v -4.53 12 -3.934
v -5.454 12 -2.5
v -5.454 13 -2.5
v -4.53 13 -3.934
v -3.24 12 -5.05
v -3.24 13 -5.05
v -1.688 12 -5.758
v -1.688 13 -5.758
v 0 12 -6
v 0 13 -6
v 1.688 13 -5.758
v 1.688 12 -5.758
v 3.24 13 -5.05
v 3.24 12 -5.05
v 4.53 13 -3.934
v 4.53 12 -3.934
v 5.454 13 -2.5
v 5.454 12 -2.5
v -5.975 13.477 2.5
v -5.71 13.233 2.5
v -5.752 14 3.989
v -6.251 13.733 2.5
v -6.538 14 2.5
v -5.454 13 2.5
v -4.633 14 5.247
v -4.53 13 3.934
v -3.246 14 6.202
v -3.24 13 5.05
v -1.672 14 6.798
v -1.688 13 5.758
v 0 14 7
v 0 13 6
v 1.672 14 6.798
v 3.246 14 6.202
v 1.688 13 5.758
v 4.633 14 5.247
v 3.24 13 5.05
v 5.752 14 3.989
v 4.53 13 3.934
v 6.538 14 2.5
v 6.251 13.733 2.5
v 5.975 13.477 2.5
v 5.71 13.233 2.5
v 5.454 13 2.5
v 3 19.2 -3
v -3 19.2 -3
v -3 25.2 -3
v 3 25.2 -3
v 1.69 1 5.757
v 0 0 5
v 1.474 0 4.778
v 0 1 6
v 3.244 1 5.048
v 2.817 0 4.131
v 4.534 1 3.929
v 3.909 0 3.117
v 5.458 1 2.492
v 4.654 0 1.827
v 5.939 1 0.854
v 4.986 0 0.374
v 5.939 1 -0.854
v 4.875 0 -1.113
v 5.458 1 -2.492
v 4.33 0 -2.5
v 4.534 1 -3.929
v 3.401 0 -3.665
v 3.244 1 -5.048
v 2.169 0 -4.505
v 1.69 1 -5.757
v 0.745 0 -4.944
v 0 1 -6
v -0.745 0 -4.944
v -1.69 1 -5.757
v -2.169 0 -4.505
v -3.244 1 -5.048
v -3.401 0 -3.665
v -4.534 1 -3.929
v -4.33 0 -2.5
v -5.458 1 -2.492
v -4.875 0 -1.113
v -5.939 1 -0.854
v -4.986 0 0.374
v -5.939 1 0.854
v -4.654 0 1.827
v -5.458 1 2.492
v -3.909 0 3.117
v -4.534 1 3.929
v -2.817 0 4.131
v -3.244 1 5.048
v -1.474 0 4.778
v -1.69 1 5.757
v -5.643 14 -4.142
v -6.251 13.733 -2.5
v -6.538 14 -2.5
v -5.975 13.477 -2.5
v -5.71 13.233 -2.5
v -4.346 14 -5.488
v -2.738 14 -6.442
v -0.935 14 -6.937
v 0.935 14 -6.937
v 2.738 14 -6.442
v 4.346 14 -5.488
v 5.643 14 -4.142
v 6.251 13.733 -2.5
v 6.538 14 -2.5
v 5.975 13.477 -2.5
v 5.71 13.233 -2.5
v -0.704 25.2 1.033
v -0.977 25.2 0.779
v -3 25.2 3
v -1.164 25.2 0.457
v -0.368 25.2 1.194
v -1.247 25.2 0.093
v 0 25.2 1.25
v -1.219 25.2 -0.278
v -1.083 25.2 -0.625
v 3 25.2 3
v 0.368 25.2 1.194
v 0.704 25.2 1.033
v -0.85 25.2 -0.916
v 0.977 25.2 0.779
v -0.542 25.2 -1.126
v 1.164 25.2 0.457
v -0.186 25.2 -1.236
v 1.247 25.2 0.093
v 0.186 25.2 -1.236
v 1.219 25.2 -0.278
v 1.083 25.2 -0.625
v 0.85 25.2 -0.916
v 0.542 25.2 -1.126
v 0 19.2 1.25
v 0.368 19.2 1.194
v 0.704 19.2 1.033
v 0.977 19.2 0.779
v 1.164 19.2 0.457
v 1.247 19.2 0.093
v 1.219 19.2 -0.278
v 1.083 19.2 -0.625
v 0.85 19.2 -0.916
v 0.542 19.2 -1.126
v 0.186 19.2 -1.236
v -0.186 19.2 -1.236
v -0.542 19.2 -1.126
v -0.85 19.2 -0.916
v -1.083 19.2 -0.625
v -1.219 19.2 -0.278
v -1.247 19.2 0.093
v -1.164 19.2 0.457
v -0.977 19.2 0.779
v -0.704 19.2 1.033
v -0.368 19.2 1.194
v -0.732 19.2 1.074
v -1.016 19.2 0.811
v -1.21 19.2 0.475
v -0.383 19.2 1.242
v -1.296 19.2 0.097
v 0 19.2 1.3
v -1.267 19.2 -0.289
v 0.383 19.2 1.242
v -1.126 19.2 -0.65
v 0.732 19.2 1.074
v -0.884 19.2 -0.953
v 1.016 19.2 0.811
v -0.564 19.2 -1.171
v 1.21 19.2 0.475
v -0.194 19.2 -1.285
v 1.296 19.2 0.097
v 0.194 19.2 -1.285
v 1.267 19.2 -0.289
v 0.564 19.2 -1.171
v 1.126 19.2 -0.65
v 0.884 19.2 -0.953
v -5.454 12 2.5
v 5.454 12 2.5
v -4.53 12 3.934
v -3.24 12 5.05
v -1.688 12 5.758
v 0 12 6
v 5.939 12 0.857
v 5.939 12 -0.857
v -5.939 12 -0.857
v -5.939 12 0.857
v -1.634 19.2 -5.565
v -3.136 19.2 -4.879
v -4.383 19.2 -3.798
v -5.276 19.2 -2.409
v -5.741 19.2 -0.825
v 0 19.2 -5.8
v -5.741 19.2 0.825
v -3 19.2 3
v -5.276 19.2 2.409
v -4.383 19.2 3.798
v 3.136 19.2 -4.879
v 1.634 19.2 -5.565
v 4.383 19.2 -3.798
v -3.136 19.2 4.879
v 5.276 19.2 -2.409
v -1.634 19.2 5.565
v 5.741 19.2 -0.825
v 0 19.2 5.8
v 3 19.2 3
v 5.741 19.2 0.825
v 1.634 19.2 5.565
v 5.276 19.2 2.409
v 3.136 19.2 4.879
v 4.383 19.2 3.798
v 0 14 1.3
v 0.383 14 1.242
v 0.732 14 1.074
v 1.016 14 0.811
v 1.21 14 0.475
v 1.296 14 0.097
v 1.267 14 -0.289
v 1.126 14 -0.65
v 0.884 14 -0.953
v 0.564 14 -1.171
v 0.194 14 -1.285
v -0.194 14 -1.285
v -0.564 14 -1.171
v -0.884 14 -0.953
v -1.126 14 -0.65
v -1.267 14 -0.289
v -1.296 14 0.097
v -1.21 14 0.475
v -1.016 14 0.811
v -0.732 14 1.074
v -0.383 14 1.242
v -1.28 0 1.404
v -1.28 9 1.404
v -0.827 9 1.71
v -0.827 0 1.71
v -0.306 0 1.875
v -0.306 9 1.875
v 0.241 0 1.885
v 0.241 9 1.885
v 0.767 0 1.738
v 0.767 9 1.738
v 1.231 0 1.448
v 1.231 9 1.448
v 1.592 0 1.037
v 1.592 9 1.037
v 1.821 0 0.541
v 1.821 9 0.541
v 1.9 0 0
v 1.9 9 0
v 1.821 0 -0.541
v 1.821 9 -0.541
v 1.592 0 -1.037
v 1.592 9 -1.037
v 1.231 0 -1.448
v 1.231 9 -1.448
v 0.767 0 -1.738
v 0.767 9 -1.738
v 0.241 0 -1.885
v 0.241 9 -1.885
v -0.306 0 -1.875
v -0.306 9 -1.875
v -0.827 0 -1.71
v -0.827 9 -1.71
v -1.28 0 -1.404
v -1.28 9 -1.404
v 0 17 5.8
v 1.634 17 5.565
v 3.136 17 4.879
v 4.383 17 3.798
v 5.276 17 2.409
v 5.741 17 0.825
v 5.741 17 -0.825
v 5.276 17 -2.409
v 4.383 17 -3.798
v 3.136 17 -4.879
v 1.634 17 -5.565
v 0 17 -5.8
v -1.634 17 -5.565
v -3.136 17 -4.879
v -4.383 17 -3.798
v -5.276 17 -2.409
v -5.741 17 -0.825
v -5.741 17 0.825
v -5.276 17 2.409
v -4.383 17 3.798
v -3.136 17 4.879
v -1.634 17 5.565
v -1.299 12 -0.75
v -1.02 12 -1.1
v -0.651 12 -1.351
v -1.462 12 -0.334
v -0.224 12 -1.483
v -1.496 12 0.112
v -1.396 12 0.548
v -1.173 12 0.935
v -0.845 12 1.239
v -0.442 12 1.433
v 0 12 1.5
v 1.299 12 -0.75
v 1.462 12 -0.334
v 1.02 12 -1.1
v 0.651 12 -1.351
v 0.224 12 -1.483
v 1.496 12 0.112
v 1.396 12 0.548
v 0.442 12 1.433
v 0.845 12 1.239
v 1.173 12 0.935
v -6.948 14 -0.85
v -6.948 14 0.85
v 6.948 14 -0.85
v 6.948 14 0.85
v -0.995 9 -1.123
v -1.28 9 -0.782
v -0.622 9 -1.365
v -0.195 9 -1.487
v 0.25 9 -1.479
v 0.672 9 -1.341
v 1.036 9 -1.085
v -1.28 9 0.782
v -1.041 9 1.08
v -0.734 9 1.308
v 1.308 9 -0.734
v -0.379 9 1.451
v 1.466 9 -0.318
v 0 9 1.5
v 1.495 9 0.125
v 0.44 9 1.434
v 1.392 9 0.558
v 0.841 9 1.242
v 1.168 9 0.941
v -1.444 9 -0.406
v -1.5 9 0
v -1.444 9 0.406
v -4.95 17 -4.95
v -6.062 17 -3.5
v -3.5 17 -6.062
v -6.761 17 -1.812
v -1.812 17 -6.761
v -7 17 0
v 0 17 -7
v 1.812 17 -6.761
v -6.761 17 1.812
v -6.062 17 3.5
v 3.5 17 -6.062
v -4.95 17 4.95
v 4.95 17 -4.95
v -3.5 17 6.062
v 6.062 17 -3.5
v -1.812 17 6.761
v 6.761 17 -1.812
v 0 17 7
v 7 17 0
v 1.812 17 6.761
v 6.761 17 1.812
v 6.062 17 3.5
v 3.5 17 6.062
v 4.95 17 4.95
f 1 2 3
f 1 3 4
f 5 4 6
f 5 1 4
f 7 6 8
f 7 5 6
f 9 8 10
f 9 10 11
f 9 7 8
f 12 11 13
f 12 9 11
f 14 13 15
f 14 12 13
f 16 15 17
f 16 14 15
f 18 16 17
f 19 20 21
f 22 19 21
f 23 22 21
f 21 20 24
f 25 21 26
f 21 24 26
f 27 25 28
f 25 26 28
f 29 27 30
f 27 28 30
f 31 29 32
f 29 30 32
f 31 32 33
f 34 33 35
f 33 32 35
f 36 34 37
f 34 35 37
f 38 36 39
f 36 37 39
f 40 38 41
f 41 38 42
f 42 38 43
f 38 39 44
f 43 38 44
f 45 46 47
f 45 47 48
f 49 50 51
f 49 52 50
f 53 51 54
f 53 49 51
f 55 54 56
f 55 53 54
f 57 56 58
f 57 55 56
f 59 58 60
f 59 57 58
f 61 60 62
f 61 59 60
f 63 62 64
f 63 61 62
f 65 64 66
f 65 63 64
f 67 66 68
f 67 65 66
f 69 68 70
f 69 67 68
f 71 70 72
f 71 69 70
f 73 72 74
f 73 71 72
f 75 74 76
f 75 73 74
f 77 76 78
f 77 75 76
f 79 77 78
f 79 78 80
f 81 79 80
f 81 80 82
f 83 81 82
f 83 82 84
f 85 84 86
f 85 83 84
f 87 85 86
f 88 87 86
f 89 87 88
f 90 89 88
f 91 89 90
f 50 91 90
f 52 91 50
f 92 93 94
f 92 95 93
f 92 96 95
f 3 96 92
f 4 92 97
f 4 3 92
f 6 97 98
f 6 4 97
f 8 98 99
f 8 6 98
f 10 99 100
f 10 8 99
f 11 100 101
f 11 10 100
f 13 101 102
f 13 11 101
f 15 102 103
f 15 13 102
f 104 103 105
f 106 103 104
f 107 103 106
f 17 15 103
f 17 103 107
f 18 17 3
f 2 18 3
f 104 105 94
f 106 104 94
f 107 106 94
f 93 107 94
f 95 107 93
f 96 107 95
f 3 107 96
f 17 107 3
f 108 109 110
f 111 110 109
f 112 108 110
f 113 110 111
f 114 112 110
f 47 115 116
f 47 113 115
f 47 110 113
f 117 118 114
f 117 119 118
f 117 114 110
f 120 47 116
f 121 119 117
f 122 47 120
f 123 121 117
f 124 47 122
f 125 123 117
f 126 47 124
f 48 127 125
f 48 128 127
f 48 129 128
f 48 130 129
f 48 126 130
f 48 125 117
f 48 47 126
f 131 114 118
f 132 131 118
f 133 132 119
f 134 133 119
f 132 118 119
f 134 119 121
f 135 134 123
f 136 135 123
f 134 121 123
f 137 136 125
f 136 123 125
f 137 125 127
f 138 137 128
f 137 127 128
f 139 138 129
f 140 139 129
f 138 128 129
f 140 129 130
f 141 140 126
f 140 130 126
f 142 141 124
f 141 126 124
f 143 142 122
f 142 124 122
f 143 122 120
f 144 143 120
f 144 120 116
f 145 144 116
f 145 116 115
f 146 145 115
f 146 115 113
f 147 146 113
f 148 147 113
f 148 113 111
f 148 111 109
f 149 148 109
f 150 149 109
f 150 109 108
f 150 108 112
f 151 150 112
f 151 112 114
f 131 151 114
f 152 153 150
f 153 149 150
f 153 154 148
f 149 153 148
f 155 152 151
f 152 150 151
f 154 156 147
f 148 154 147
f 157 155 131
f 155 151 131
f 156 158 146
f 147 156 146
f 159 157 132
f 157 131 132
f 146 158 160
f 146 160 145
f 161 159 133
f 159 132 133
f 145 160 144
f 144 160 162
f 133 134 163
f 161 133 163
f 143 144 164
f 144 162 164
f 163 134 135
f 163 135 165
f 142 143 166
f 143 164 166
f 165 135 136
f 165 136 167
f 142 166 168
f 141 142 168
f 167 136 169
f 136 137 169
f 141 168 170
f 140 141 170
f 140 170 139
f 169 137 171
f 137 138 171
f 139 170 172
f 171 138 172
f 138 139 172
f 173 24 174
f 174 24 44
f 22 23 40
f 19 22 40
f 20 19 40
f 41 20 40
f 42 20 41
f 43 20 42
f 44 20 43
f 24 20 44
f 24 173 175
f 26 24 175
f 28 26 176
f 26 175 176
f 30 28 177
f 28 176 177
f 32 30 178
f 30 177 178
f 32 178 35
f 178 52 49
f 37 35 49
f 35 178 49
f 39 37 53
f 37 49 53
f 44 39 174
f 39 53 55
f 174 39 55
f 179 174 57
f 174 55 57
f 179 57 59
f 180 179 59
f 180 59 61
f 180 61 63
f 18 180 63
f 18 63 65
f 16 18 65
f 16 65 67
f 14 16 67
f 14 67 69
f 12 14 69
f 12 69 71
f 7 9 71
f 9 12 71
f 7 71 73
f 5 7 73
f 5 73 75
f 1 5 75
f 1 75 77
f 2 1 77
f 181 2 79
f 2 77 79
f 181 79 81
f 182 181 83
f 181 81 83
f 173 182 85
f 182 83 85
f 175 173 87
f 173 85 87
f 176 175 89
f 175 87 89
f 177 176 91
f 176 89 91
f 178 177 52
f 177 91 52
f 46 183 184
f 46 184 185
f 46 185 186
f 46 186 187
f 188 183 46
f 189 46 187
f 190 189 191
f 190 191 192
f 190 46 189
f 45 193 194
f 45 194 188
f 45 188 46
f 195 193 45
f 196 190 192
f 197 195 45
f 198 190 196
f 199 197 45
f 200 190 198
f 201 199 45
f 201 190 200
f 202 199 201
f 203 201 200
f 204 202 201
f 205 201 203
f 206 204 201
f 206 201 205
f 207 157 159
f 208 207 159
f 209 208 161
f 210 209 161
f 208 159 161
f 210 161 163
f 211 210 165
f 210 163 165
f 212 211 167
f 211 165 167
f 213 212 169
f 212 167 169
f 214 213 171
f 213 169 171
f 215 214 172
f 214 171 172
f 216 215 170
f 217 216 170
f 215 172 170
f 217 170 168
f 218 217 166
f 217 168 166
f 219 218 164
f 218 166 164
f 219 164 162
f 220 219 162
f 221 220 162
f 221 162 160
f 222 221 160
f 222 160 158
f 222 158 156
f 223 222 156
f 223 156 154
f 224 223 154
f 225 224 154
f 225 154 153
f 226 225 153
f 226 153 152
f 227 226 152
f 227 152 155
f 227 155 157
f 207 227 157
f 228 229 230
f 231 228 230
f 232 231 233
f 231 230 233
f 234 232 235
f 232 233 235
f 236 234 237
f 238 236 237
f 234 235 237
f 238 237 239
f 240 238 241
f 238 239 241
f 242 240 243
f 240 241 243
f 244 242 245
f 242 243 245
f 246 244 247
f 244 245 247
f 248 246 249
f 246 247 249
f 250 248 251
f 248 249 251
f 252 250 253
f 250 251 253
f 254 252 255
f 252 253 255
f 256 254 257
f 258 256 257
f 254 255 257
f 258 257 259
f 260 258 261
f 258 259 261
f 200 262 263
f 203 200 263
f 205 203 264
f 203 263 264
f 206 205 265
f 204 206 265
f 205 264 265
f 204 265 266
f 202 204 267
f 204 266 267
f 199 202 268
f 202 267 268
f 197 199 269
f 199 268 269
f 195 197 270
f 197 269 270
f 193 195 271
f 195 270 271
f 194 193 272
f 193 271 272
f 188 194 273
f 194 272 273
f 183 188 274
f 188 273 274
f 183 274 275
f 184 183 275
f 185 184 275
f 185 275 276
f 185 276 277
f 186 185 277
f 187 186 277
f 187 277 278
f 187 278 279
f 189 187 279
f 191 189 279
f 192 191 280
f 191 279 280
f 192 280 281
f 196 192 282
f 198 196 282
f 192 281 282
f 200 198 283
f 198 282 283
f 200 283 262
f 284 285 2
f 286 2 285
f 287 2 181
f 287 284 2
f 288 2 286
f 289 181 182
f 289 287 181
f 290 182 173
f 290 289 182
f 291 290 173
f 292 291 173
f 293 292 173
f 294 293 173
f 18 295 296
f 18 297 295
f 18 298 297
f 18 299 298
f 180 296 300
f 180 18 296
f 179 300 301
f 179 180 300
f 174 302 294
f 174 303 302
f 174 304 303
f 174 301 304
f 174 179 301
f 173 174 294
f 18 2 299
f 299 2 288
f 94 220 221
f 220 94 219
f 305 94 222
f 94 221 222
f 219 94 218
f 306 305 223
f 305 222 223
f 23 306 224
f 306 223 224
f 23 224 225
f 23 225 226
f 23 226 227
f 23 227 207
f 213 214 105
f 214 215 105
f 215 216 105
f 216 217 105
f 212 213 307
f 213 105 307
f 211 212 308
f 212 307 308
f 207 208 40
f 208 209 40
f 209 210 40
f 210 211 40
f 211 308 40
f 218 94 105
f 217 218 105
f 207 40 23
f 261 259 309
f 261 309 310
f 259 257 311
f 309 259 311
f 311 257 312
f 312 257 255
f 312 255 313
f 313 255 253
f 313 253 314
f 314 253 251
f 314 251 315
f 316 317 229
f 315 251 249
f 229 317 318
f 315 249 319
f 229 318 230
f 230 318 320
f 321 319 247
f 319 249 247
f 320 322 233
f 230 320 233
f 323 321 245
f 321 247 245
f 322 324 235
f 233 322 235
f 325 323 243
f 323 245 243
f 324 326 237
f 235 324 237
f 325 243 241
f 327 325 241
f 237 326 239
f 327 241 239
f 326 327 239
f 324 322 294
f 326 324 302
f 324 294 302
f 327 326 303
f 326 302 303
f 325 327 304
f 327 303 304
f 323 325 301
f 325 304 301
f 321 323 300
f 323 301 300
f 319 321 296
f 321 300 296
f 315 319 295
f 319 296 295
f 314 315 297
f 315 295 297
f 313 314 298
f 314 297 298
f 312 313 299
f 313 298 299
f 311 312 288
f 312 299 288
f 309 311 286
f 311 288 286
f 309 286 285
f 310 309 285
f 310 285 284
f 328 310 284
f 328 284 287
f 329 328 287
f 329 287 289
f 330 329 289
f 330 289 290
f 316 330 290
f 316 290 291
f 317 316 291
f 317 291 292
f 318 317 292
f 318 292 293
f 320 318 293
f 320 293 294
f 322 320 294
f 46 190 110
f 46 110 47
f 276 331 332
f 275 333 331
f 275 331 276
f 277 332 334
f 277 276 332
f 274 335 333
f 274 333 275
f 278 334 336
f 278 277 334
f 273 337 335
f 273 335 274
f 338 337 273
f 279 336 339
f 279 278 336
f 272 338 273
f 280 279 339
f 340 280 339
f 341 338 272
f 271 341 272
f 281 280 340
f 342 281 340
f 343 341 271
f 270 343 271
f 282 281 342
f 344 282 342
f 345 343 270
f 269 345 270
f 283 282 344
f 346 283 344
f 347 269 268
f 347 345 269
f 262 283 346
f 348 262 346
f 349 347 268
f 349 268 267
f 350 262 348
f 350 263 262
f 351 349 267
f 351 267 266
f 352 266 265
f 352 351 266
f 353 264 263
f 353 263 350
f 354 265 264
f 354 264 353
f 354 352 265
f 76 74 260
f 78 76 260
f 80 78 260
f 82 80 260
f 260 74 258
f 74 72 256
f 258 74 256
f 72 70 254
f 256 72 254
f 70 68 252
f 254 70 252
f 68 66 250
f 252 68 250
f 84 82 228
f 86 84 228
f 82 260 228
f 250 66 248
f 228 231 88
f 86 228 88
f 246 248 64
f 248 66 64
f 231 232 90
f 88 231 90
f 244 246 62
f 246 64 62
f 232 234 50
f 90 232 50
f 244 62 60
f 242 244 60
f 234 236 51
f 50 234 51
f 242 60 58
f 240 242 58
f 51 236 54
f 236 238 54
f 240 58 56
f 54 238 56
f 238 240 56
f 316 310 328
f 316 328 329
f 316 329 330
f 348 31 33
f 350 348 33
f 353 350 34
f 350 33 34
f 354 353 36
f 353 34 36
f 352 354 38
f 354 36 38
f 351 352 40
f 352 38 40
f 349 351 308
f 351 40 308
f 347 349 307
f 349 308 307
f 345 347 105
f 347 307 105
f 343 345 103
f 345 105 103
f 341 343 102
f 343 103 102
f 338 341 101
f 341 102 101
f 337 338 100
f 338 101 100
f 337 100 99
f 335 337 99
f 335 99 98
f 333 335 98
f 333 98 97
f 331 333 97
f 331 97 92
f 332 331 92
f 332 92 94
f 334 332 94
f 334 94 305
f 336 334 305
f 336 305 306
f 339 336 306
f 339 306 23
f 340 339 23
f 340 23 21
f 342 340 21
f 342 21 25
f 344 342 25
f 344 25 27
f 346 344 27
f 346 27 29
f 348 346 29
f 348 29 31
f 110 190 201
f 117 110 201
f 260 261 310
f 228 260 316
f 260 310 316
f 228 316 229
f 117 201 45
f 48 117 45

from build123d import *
from build123d.topology import SkipClean

# Parameters (mm, degrees)
SKETCH_1_R          = 6
EXTRUDE_1_DEPTH     = 9
CUT_EXTRUDE_1_DEPTH = 13.369316877
SKETCH_3_R          = 6
EXTRUDE_2_DEPTH     = 3
SKETCH_4_R          = 1.5
CUT_EXTRUDE_2_DEPTH = 3
EXTRUDE_3_DEPTH     = 2
SKETCH_7_R          = 7
EXTRUDE_4_DEPTH     = 3
SKETCH_8_R          = 5.8
EXTRUDE_5_DEPTH     = 2.2
SKETCH_9_R          = 1.3
CUT_EXTRUDE_3_DEPTH = 6
CHAMFER_1_SIZE      = 1
SKETCH_10_W         = 6
SKETCH_10_H         = 6
EXTRUDE_6_DEPTH     = 6
SKETCH_11_R         = 1.25
CUT_EXTRUDE_4_DEPTH = 8


with BuildPart() as part:
    # Эскиз1 → Бобышка-Вытянуть1 (new body)
    with BuildSketch(Plane(origin=(0, 0, 0), x_dir=(1, 0, 0), z_dir=(0, 1, 0))):
        with Locations(Location((0, 0, 0), (0, 0, 270))):
            Circle(SKETCH_1_R)
    extrude(amount=EXTRUDE_1_DEPTH)

    # Эскиз2 → Вырез-Вытянуть1 (cut, through all)
    with BuildSketch(Plane(origin=(0, 9, 0), x_dir=(1, 0, 0), z_dir=(0, 1, 0))):
        with BuildLine():
            Line((-1.28, 1.404136745), (-1.28, -1.404136745))
            ThreePointArc((-1.28, -1.404136745), (1.9, 0), (-1.28, 1.404136745))
        make_face()
    extrude(amount=-CUT_EXTRUDE_1_DEPTH, mode=Mode.SUBTRACT)

    # Эскиз3 → Бобышка-Вытянуть2 (add)
    with BuildSketch(Plane(origin=(0, 9, 0), x_dir=(1, 0, 0), z_dir=(0, 1, 0))):
        with Locations(Location((0, 0, 0), (0, 0, 270))):
            Circle(SKETCH_3_R)
    extrude(amount=EXTRUDE_2_DEPTH)

    # Эскиз4 → Вырез-Вытянуть2 (cut)
    with BuildSketch(Plane(origin=(0, 12, 0), x_dir=(1, 0, 0), z_dir=(0, 1, 0))):
        with Locations(Location((0, 0, 0), (0, 0, 270))):
            Circle(SKETCH_4_R)
    extrude(amount=-CUT_EXTRUDE_2_DEPTH, mode=Mode.SUBTRACT)

    # Эскиз5 → Бобышка-Вытянуть3 (add)
    with SkipClean():  # the faces are left unmerged after this step: merging them gives an invalid solid
        with BuildSketch(Plane(origin=(0, 12, 0), x_dir=(1, 0, 0), z_dir=(0, 1, 0))):
            with BuildLine():
                Line((5.454356057, 2.5), (-5.454356057, 2.5))
                ThreePointArc((-5.454356057, 2.5), (0, 6), (5.454356057, 2.5))
            make_face()
            with BuildLine():
                Line((5.454356057, -2.5), (-5.454356057, -2.5))
                ThreePointArc((-5.454356057, -2.5), (0, -6), (5.454356057, -2.5))
            make_face()
        extrude(amount=EXTRUDE_3_DEPTH)

    # Эскиз7 → Бобышка-Вытянуть4 (add)
    with BuildSketch(Plane(origin=(0, 14, 0), x_dir=(1, 0, 0), z_dir=(0, 1, 0))):
        with Locations(Location((0, 0, 0), (0, 0, 270))):
            Circle(SKETCH_7_R)
    extrude(amount=EXTRUDE_4_DEPTH)

    # Эскиз8 → Бобышка-Вытянуть5 (add)
    with BuildSketch(Plane(origin=(0, 17, 0), x_dir=(1, 0, 0), z_dir=(0, 1, 0))):
        with Locations(Location((0, 0, 0), (0, 0, 270))):
            Circle(SKETCH_8_R)
    extrude(amount=EXTRUDE_5_DEPTH)

    # Эскиз9 → Вырез-Вытянуть3 (cut)
    with BuildSketch(Plane(origin=(0, 19.2, 0), x_dir=(1, 0, 0), z_dir=(0, 1, 0))):
        with Locations(Location((0, 0, 0), (0, 0, 270))):
            Circle(SKETCH_9_R)
    extrude(amount=-CUT_EXTRUDE_3_DEPTH, mode=Mode.SUBTRACT)

    # Фаска1
    # the kernel refuses this chamfer: 1 mm, written as the material it adds along each edge
    with BuildSketch(Plane(origin=(0, 14, 0), x_dir=(-0.9999996815285755, 0, -0.0007980869299166744), z_dir=(-0.0007980869299166744, 0, 0.9999996815285755))) as chamfer_1_piece_1_section:
        Polygon((6 + CHAMFER_1_SIZE, 0), (6, CHAMFER_1_SIZE), (6, 0), align=None)
    chamfer_1_piece_1 = revolve(axis=Axis((0, 14, 0), (0, -1, 0)), revolution_arc=179.908545965, mode=Mode.PRIVATE)
    chamfer_1_piece_1 = chamfer_1_piece_1 & Plane(origin=(0, 13.500057011, 0), x_dir=(0, 0, 1), z_dir=(0, -1, 0)) * Cylinder(7, 28, mode=Mode.PRIVATE)
    chamfer_1_piece_1 = split(chamfer_1_piece_1, bisect_by=Plane(origin=(0, 13.500057011, -2.5), z_dir=(0, 0, -1)), keep=Keep.TOP, mode=Mode.PRIVATE)
    add(chamfer_1_piece_1)
    with BuildSketch(Plane(origin=(0, 14, 0), x_dir=(-0.9999996815285755, 0, 0.0007980869299168965), z_dir=(-0.0007980869299168965, 0, -0.9999996815285755))) as chamfer_1_piece_2_section:
        Polygon((6 + CHAMFER_1_SIZE, 0), (6, -CHAMFER_1_SIZE), (6, 0), align=None)
    chamfer_1_piece_2 = revolve(axis=Axis((0, 14, 0), (0, 1, 0)), revolution_arc=179.908545965, mode=Mode.PRIVATE)
    chamfer_1_piece_2 = chamfer_1_piece_2 & Plane(origin=(0, 13.500057011, 0), x_dir=(0, 0, 1), z_dir=(0, -1, 0)) * Cylinder(7, 28, mode=Mode.PRIVATE)
    chamfer_1_piece_2 = split(chamfer_1_piece_2, bisect_by=Plane(origin=(0, 13.500057011, 2.5), z_dir=(0, 0, 1)), keep=Keep.TOP, mode=Mode.PRIVATE)
    add(chamfer_1_piece_2)
    # the kernel refuses this chamfer: 1 mm, written as the material it takes off along each edge
    with BuildSketch(Plane(origin=(0, 0, 0), x_dir=(0, 0, 1), z_dir=(-1, 0, 0))) as chamfer_1_2_piece_1:
        Polygon((6 - CHAMFER_1_SIZE, 0), (6, CHAMFER_1_SIZE), (6, 0), align=None)
    revolve(axis=Axis((0, 0, 0), (0, 1, 0)), mode=Mode.SUBTRACT)

    # Эскиз10 → Бобышка-Вытянуть6 (add)
    with BuildSketch(Plane(origin=(0, 19.2, 0), x_dir=(1, 0, 0), z_dir=(0, 1, 0))):
        Rectangle(SKETCH_10_W, SKETCH_10_H)
    extrude(amount=EXTRUDE_6_DEPTH)

    # Эскиз11 → Вырез-Вытянуть4 (cut)
    with BuildSketch(Plane(origin=(0, 25.2, 0), x_dir=(1, 0, 0), z_dir=(0, 1, 0))):
        with Locations(Location((0, 0, 0), (0, 0, 270))):
            Circle(SKETCH_11_R)
    extrude(amount=-CUT_EXTRUDE_4_DEPTH, mode=Mode.SUBTRACT)


solid = part.part
